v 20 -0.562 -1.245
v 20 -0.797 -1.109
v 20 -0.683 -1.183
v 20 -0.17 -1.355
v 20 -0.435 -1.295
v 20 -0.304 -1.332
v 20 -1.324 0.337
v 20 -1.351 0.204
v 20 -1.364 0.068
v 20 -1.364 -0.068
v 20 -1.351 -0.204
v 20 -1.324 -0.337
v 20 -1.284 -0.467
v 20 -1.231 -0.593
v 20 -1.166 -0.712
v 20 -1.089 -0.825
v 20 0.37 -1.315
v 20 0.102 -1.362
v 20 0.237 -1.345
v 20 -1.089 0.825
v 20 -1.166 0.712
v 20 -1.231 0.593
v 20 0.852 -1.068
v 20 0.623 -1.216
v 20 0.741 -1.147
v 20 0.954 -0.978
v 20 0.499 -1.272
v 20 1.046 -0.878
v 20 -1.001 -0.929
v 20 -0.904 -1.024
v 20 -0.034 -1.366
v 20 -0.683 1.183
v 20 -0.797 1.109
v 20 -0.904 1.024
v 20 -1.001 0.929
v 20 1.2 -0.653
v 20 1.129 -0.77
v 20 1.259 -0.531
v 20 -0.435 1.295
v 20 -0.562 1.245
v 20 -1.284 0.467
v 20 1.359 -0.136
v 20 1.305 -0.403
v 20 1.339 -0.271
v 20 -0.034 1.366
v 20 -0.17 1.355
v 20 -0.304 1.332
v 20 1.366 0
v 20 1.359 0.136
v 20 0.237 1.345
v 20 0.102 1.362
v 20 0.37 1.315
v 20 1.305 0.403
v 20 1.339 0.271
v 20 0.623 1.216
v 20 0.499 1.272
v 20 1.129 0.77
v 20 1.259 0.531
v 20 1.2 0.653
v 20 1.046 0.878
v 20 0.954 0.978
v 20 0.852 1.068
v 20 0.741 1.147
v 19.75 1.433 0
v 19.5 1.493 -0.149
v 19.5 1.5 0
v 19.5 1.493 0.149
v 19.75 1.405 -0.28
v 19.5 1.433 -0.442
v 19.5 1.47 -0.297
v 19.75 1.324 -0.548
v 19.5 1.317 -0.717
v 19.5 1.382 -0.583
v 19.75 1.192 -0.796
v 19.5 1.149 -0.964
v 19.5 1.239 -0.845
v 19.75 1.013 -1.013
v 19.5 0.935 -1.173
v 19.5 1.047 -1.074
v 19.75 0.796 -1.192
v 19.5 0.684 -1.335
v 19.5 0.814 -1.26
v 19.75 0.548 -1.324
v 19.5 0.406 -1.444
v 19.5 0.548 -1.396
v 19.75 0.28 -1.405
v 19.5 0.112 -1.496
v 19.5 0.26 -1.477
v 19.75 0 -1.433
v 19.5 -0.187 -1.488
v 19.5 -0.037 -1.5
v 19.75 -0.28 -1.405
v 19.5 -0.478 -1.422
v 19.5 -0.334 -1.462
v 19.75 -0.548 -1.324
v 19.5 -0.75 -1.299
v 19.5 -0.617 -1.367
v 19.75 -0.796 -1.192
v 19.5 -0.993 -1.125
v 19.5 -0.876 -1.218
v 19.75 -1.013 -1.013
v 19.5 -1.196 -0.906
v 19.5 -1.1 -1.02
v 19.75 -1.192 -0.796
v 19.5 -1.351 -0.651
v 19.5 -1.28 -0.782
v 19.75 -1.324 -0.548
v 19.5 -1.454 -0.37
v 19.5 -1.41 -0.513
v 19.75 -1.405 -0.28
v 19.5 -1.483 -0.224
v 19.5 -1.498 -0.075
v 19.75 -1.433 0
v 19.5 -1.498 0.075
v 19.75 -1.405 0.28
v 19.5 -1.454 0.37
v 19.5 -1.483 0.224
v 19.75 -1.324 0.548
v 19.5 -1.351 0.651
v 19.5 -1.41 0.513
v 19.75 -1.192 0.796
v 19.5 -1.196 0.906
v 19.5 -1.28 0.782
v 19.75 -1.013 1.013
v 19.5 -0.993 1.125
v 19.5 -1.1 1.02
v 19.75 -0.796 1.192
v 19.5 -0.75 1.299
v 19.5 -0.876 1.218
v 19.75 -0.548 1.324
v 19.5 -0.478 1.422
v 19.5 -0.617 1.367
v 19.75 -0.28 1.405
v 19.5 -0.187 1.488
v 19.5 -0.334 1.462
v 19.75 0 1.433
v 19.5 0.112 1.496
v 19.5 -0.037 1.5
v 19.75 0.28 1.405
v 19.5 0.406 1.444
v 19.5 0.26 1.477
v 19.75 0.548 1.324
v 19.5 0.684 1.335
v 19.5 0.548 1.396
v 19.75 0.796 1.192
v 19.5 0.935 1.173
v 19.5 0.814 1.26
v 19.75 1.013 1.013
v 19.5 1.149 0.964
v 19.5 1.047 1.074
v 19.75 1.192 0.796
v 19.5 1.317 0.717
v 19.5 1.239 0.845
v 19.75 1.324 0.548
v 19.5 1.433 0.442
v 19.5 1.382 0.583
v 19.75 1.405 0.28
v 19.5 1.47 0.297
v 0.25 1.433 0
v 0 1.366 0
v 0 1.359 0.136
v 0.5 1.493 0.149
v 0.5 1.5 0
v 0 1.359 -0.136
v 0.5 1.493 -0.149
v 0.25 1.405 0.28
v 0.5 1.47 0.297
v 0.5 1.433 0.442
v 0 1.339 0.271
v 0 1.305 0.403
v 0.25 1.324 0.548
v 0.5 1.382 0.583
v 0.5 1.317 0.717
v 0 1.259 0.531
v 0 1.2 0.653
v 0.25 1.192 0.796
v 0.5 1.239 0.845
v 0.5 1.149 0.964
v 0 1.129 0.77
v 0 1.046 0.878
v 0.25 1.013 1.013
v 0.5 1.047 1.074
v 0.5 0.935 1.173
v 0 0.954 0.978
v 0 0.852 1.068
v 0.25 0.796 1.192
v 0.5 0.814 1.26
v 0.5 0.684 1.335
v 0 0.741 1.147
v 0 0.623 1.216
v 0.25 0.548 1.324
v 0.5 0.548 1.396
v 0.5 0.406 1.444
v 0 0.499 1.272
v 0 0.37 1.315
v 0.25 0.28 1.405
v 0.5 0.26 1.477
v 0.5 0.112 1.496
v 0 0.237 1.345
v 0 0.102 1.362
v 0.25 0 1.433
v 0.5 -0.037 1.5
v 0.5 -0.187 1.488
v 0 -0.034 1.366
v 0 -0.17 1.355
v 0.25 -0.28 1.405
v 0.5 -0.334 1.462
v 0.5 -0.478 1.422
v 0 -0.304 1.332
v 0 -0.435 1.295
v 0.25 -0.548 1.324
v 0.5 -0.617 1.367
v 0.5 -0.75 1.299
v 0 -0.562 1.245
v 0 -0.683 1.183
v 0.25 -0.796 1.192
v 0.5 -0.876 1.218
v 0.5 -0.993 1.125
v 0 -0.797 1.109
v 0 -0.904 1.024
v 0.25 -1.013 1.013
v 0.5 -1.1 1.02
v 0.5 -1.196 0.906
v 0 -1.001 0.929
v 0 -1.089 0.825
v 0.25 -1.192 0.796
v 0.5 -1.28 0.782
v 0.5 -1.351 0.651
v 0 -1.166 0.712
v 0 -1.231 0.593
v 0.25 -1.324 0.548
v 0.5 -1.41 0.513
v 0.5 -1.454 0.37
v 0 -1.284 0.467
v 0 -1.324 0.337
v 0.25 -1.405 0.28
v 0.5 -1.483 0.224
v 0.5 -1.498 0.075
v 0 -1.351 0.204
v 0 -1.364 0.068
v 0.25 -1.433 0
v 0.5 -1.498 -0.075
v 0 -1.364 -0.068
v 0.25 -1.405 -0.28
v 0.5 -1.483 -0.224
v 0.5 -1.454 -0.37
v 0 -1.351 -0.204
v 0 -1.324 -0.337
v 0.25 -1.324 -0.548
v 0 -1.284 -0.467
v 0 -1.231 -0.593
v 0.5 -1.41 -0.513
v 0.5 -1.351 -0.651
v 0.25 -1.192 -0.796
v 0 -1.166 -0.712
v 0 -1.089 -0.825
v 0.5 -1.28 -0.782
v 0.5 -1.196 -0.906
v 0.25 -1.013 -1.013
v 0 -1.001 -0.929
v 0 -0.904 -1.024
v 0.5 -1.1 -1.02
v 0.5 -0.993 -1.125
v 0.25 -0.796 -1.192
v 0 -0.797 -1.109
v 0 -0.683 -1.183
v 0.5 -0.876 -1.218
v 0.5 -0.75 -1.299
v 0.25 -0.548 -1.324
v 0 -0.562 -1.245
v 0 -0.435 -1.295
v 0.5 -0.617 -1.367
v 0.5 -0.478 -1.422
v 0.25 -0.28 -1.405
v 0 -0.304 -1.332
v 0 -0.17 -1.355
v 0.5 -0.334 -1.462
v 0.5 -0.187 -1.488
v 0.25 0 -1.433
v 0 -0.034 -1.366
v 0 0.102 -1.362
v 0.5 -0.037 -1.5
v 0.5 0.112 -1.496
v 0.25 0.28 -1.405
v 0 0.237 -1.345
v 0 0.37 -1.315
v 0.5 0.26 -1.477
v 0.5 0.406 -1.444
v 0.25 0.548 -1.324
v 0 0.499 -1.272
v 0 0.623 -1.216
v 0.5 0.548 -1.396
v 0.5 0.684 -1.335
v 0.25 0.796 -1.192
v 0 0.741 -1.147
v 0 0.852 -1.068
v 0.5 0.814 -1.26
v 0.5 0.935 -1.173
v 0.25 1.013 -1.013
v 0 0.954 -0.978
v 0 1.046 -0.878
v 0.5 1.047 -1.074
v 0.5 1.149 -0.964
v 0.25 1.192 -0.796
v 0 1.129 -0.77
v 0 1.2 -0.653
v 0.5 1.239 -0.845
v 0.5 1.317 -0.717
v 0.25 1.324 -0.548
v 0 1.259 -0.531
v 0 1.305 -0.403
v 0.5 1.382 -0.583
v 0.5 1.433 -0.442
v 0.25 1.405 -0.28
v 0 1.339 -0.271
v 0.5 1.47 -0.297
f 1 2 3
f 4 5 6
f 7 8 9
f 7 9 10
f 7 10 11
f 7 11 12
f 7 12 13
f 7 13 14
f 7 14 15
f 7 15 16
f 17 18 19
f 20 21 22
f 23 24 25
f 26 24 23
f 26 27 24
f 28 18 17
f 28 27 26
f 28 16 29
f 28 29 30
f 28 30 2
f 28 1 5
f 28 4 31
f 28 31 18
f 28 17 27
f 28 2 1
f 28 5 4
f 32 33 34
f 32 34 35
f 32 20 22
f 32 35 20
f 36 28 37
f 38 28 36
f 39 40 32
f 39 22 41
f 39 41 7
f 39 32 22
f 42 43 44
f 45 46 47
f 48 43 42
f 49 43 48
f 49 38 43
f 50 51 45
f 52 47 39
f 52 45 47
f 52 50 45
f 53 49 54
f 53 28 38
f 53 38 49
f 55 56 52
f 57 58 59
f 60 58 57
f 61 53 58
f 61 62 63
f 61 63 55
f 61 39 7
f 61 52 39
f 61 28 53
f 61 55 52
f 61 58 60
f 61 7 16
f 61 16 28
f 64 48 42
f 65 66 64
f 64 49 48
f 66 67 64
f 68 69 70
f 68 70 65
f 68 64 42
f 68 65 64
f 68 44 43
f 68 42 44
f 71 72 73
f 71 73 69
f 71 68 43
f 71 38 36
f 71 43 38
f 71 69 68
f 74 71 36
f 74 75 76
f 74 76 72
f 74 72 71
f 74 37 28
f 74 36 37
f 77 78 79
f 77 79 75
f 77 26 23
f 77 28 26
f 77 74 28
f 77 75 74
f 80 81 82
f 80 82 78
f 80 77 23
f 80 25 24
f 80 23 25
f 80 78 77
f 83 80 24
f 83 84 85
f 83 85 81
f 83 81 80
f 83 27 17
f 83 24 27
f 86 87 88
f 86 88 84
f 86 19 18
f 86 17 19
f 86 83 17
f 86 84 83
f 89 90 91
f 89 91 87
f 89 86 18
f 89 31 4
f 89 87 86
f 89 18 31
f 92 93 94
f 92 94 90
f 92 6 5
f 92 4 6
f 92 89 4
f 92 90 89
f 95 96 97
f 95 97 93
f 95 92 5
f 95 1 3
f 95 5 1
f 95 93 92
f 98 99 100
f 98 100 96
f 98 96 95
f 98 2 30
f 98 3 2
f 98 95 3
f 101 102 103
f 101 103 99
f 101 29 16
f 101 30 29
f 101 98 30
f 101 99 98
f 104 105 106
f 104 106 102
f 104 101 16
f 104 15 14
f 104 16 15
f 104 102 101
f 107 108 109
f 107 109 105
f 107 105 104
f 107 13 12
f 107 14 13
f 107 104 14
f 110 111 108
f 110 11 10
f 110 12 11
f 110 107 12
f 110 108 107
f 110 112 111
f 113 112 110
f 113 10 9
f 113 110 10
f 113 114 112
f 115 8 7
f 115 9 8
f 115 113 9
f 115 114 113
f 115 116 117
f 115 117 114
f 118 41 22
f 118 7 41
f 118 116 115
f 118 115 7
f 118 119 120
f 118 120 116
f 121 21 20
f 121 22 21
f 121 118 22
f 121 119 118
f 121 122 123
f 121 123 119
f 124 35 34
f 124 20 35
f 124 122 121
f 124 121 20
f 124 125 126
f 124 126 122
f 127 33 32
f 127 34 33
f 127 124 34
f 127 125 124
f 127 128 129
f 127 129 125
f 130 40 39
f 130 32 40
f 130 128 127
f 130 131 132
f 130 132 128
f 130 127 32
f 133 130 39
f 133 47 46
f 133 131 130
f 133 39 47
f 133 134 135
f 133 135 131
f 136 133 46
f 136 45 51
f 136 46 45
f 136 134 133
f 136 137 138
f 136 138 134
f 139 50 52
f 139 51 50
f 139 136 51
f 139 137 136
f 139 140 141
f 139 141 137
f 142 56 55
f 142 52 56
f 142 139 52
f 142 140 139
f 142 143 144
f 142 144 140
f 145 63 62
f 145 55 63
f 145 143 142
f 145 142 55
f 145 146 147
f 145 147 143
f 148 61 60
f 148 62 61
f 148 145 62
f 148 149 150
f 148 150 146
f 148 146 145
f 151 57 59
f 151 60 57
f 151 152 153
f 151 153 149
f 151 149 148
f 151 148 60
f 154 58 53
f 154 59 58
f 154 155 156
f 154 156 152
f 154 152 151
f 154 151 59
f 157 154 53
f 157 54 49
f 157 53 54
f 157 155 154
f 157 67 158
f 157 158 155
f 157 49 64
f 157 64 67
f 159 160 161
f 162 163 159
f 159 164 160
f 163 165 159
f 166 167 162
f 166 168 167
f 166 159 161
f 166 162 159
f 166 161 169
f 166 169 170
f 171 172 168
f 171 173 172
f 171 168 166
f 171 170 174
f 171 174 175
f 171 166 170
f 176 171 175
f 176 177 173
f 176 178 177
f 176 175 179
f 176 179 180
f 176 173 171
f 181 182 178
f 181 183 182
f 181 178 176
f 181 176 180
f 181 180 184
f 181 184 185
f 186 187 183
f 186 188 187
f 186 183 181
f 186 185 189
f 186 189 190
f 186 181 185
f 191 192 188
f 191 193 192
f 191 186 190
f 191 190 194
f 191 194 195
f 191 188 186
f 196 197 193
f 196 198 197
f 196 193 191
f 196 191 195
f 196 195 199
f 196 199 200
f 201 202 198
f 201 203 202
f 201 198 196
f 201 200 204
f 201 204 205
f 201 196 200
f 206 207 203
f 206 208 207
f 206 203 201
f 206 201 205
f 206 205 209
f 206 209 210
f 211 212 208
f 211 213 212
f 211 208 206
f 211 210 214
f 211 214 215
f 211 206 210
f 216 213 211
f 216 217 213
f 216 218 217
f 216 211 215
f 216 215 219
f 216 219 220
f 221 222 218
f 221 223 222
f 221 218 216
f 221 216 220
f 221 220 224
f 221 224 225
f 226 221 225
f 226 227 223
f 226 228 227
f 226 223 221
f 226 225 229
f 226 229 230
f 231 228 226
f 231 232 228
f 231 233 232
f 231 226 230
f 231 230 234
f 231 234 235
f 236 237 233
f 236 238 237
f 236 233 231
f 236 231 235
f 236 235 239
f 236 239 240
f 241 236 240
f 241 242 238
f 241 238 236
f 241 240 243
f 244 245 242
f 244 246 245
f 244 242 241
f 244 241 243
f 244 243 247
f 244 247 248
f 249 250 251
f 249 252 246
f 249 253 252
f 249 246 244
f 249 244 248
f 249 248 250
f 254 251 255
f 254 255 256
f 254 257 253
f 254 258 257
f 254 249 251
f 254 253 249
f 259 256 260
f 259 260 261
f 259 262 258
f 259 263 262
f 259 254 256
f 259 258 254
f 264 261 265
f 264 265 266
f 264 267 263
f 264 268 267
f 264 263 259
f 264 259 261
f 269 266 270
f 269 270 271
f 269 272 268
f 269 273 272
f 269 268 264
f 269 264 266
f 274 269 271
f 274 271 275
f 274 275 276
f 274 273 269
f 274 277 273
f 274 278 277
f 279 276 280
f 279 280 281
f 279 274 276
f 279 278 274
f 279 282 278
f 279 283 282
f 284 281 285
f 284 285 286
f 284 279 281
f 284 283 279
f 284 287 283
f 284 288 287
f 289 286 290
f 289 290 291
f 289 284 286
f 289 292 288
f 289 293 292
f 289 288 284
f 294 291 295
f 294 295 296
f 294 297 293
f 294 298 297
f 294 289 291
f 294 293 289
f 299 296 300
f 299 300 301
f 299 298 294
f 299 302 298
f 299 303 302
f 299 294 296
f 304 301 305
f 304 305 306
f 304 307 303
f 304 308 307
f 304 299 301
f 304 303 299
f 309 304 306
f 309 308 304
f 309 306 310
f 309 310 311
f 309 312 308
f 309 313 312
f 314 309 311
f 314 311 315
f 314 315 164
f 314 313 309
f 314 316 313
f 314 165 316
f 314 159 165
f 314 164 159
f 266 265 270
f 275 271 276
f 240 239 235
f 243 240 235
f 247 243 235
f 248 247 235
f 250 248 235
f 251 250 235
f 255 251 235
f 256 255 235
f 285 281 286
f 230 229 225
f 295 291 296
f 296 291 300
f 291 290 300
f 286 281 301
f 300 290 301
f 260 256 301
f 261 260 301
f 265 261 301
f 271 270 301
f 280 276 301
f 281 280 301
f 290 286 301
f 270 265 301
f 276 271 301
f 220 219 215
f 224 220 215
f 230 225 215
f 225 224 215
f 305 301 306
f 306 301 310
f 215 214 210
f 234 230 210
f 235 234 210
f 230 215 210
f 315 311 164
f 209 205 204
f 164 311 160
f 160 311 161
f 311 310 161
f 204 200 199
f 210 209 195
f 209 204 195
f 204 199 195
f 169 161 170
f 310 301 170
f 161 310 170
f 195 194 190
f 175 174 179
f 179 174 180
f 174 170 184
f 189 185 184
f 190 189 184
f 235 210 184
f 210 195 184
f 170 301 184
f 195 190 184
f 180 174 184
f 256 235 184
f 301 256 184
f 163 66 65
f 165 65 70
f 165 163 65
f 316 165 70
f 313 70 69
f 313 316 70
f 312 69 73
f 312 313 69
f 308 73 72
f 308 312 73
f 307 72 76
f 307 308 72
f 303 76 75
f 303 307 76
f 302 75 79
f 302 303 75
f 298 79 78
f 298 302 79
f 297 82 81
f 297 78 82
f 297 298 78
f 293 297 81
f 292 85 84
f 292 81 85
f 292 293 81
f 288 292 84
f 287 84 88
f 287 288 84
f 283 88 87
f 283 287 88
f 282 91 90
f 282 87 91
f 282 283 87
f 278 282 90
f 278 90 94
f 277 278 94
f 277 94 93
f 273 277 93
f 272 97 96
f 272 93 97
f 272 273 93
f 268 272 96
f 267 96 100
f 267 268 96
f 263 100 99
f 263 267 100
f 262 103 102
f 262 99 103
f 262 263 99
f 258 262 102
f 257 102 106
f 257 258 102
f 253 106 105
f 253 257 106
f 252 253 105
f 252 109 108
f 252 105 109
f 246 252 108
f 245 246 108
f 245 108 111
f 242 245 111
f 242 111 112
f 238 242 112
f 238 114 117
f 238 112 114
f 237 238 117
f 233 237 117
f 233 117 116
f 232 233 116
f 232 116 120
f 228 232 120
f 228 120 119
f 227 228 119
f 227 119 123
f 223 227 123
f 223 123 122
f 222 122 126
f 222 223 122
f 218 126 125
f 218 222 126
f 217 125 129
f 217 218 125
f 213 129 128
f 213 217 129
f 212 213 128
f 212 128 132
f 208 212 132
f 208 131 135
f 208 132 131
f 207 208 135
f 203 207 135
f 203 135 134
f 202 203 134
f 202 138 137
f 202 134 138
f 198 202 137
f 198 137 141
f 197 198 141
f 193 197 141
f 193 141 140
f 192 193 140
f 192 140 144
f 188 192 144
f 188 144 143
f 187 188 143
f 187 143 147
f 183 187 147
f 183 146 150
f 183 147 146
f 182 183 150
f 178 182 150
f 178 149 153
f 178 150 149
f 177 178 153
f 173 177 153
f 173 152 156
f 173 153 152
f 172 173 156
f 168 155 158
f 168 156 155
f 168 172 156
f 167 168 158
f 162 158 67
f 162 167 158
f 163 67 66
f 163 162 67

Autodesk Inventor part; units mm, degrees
ref_plane "YZ Plane" through (0, 0, 0) normal (1, 0, 0) x (0, 1, 0)
ref_plane "XZ Plane" through (0, 0, 0) normal (0, 1, 0) x (-1, 0, 0)
ref_plane "XY Plane" through (0, 0, 0) normal (0, 0, 1) x (1, 0, 0)
sketch "Skizze" plane through (0, 0, 0) normal (1, 0, 0) x (0, 1, 0)
  circle A0 centre (0, 0) radius 1.5
  dimension "d1" = 3
extrude "Körper" add sketch "Skizze" along normal blind 20
chamfer "Fase1" distance 0.5 angle 15 1 edges at (0, -1.5, 0) measured on face at (13.3333, 1.4806, -0.2406)
chamfer "Fase2" distance 0.5 angle 15 1 edges at (20, -1.5, 0) measured on face at (13.5, 1.4951, -0.1207)
equation "\"d1\" = NND"
equation "\"d2\" = NLG"
equation "\"d4\" = PHH"
equation "\"d5\" = FAWI"
equation "\"d11\" = PHH"
equation "\"d8\" = PHH"
equation "\"d9\" = FAWI"
equation "\"d12\" = PHH"
equation "\"NND\" = 3"
equation "\"NLG\" = 20"
equation "\"PHH\" = 0.5"
equation "\"FAWI\" = 15deg"
equation "\"KAH\" = 0"
properties part number "ISO 2338 - 3 m6 x 20" material "Edelstahl, austenitisch"
